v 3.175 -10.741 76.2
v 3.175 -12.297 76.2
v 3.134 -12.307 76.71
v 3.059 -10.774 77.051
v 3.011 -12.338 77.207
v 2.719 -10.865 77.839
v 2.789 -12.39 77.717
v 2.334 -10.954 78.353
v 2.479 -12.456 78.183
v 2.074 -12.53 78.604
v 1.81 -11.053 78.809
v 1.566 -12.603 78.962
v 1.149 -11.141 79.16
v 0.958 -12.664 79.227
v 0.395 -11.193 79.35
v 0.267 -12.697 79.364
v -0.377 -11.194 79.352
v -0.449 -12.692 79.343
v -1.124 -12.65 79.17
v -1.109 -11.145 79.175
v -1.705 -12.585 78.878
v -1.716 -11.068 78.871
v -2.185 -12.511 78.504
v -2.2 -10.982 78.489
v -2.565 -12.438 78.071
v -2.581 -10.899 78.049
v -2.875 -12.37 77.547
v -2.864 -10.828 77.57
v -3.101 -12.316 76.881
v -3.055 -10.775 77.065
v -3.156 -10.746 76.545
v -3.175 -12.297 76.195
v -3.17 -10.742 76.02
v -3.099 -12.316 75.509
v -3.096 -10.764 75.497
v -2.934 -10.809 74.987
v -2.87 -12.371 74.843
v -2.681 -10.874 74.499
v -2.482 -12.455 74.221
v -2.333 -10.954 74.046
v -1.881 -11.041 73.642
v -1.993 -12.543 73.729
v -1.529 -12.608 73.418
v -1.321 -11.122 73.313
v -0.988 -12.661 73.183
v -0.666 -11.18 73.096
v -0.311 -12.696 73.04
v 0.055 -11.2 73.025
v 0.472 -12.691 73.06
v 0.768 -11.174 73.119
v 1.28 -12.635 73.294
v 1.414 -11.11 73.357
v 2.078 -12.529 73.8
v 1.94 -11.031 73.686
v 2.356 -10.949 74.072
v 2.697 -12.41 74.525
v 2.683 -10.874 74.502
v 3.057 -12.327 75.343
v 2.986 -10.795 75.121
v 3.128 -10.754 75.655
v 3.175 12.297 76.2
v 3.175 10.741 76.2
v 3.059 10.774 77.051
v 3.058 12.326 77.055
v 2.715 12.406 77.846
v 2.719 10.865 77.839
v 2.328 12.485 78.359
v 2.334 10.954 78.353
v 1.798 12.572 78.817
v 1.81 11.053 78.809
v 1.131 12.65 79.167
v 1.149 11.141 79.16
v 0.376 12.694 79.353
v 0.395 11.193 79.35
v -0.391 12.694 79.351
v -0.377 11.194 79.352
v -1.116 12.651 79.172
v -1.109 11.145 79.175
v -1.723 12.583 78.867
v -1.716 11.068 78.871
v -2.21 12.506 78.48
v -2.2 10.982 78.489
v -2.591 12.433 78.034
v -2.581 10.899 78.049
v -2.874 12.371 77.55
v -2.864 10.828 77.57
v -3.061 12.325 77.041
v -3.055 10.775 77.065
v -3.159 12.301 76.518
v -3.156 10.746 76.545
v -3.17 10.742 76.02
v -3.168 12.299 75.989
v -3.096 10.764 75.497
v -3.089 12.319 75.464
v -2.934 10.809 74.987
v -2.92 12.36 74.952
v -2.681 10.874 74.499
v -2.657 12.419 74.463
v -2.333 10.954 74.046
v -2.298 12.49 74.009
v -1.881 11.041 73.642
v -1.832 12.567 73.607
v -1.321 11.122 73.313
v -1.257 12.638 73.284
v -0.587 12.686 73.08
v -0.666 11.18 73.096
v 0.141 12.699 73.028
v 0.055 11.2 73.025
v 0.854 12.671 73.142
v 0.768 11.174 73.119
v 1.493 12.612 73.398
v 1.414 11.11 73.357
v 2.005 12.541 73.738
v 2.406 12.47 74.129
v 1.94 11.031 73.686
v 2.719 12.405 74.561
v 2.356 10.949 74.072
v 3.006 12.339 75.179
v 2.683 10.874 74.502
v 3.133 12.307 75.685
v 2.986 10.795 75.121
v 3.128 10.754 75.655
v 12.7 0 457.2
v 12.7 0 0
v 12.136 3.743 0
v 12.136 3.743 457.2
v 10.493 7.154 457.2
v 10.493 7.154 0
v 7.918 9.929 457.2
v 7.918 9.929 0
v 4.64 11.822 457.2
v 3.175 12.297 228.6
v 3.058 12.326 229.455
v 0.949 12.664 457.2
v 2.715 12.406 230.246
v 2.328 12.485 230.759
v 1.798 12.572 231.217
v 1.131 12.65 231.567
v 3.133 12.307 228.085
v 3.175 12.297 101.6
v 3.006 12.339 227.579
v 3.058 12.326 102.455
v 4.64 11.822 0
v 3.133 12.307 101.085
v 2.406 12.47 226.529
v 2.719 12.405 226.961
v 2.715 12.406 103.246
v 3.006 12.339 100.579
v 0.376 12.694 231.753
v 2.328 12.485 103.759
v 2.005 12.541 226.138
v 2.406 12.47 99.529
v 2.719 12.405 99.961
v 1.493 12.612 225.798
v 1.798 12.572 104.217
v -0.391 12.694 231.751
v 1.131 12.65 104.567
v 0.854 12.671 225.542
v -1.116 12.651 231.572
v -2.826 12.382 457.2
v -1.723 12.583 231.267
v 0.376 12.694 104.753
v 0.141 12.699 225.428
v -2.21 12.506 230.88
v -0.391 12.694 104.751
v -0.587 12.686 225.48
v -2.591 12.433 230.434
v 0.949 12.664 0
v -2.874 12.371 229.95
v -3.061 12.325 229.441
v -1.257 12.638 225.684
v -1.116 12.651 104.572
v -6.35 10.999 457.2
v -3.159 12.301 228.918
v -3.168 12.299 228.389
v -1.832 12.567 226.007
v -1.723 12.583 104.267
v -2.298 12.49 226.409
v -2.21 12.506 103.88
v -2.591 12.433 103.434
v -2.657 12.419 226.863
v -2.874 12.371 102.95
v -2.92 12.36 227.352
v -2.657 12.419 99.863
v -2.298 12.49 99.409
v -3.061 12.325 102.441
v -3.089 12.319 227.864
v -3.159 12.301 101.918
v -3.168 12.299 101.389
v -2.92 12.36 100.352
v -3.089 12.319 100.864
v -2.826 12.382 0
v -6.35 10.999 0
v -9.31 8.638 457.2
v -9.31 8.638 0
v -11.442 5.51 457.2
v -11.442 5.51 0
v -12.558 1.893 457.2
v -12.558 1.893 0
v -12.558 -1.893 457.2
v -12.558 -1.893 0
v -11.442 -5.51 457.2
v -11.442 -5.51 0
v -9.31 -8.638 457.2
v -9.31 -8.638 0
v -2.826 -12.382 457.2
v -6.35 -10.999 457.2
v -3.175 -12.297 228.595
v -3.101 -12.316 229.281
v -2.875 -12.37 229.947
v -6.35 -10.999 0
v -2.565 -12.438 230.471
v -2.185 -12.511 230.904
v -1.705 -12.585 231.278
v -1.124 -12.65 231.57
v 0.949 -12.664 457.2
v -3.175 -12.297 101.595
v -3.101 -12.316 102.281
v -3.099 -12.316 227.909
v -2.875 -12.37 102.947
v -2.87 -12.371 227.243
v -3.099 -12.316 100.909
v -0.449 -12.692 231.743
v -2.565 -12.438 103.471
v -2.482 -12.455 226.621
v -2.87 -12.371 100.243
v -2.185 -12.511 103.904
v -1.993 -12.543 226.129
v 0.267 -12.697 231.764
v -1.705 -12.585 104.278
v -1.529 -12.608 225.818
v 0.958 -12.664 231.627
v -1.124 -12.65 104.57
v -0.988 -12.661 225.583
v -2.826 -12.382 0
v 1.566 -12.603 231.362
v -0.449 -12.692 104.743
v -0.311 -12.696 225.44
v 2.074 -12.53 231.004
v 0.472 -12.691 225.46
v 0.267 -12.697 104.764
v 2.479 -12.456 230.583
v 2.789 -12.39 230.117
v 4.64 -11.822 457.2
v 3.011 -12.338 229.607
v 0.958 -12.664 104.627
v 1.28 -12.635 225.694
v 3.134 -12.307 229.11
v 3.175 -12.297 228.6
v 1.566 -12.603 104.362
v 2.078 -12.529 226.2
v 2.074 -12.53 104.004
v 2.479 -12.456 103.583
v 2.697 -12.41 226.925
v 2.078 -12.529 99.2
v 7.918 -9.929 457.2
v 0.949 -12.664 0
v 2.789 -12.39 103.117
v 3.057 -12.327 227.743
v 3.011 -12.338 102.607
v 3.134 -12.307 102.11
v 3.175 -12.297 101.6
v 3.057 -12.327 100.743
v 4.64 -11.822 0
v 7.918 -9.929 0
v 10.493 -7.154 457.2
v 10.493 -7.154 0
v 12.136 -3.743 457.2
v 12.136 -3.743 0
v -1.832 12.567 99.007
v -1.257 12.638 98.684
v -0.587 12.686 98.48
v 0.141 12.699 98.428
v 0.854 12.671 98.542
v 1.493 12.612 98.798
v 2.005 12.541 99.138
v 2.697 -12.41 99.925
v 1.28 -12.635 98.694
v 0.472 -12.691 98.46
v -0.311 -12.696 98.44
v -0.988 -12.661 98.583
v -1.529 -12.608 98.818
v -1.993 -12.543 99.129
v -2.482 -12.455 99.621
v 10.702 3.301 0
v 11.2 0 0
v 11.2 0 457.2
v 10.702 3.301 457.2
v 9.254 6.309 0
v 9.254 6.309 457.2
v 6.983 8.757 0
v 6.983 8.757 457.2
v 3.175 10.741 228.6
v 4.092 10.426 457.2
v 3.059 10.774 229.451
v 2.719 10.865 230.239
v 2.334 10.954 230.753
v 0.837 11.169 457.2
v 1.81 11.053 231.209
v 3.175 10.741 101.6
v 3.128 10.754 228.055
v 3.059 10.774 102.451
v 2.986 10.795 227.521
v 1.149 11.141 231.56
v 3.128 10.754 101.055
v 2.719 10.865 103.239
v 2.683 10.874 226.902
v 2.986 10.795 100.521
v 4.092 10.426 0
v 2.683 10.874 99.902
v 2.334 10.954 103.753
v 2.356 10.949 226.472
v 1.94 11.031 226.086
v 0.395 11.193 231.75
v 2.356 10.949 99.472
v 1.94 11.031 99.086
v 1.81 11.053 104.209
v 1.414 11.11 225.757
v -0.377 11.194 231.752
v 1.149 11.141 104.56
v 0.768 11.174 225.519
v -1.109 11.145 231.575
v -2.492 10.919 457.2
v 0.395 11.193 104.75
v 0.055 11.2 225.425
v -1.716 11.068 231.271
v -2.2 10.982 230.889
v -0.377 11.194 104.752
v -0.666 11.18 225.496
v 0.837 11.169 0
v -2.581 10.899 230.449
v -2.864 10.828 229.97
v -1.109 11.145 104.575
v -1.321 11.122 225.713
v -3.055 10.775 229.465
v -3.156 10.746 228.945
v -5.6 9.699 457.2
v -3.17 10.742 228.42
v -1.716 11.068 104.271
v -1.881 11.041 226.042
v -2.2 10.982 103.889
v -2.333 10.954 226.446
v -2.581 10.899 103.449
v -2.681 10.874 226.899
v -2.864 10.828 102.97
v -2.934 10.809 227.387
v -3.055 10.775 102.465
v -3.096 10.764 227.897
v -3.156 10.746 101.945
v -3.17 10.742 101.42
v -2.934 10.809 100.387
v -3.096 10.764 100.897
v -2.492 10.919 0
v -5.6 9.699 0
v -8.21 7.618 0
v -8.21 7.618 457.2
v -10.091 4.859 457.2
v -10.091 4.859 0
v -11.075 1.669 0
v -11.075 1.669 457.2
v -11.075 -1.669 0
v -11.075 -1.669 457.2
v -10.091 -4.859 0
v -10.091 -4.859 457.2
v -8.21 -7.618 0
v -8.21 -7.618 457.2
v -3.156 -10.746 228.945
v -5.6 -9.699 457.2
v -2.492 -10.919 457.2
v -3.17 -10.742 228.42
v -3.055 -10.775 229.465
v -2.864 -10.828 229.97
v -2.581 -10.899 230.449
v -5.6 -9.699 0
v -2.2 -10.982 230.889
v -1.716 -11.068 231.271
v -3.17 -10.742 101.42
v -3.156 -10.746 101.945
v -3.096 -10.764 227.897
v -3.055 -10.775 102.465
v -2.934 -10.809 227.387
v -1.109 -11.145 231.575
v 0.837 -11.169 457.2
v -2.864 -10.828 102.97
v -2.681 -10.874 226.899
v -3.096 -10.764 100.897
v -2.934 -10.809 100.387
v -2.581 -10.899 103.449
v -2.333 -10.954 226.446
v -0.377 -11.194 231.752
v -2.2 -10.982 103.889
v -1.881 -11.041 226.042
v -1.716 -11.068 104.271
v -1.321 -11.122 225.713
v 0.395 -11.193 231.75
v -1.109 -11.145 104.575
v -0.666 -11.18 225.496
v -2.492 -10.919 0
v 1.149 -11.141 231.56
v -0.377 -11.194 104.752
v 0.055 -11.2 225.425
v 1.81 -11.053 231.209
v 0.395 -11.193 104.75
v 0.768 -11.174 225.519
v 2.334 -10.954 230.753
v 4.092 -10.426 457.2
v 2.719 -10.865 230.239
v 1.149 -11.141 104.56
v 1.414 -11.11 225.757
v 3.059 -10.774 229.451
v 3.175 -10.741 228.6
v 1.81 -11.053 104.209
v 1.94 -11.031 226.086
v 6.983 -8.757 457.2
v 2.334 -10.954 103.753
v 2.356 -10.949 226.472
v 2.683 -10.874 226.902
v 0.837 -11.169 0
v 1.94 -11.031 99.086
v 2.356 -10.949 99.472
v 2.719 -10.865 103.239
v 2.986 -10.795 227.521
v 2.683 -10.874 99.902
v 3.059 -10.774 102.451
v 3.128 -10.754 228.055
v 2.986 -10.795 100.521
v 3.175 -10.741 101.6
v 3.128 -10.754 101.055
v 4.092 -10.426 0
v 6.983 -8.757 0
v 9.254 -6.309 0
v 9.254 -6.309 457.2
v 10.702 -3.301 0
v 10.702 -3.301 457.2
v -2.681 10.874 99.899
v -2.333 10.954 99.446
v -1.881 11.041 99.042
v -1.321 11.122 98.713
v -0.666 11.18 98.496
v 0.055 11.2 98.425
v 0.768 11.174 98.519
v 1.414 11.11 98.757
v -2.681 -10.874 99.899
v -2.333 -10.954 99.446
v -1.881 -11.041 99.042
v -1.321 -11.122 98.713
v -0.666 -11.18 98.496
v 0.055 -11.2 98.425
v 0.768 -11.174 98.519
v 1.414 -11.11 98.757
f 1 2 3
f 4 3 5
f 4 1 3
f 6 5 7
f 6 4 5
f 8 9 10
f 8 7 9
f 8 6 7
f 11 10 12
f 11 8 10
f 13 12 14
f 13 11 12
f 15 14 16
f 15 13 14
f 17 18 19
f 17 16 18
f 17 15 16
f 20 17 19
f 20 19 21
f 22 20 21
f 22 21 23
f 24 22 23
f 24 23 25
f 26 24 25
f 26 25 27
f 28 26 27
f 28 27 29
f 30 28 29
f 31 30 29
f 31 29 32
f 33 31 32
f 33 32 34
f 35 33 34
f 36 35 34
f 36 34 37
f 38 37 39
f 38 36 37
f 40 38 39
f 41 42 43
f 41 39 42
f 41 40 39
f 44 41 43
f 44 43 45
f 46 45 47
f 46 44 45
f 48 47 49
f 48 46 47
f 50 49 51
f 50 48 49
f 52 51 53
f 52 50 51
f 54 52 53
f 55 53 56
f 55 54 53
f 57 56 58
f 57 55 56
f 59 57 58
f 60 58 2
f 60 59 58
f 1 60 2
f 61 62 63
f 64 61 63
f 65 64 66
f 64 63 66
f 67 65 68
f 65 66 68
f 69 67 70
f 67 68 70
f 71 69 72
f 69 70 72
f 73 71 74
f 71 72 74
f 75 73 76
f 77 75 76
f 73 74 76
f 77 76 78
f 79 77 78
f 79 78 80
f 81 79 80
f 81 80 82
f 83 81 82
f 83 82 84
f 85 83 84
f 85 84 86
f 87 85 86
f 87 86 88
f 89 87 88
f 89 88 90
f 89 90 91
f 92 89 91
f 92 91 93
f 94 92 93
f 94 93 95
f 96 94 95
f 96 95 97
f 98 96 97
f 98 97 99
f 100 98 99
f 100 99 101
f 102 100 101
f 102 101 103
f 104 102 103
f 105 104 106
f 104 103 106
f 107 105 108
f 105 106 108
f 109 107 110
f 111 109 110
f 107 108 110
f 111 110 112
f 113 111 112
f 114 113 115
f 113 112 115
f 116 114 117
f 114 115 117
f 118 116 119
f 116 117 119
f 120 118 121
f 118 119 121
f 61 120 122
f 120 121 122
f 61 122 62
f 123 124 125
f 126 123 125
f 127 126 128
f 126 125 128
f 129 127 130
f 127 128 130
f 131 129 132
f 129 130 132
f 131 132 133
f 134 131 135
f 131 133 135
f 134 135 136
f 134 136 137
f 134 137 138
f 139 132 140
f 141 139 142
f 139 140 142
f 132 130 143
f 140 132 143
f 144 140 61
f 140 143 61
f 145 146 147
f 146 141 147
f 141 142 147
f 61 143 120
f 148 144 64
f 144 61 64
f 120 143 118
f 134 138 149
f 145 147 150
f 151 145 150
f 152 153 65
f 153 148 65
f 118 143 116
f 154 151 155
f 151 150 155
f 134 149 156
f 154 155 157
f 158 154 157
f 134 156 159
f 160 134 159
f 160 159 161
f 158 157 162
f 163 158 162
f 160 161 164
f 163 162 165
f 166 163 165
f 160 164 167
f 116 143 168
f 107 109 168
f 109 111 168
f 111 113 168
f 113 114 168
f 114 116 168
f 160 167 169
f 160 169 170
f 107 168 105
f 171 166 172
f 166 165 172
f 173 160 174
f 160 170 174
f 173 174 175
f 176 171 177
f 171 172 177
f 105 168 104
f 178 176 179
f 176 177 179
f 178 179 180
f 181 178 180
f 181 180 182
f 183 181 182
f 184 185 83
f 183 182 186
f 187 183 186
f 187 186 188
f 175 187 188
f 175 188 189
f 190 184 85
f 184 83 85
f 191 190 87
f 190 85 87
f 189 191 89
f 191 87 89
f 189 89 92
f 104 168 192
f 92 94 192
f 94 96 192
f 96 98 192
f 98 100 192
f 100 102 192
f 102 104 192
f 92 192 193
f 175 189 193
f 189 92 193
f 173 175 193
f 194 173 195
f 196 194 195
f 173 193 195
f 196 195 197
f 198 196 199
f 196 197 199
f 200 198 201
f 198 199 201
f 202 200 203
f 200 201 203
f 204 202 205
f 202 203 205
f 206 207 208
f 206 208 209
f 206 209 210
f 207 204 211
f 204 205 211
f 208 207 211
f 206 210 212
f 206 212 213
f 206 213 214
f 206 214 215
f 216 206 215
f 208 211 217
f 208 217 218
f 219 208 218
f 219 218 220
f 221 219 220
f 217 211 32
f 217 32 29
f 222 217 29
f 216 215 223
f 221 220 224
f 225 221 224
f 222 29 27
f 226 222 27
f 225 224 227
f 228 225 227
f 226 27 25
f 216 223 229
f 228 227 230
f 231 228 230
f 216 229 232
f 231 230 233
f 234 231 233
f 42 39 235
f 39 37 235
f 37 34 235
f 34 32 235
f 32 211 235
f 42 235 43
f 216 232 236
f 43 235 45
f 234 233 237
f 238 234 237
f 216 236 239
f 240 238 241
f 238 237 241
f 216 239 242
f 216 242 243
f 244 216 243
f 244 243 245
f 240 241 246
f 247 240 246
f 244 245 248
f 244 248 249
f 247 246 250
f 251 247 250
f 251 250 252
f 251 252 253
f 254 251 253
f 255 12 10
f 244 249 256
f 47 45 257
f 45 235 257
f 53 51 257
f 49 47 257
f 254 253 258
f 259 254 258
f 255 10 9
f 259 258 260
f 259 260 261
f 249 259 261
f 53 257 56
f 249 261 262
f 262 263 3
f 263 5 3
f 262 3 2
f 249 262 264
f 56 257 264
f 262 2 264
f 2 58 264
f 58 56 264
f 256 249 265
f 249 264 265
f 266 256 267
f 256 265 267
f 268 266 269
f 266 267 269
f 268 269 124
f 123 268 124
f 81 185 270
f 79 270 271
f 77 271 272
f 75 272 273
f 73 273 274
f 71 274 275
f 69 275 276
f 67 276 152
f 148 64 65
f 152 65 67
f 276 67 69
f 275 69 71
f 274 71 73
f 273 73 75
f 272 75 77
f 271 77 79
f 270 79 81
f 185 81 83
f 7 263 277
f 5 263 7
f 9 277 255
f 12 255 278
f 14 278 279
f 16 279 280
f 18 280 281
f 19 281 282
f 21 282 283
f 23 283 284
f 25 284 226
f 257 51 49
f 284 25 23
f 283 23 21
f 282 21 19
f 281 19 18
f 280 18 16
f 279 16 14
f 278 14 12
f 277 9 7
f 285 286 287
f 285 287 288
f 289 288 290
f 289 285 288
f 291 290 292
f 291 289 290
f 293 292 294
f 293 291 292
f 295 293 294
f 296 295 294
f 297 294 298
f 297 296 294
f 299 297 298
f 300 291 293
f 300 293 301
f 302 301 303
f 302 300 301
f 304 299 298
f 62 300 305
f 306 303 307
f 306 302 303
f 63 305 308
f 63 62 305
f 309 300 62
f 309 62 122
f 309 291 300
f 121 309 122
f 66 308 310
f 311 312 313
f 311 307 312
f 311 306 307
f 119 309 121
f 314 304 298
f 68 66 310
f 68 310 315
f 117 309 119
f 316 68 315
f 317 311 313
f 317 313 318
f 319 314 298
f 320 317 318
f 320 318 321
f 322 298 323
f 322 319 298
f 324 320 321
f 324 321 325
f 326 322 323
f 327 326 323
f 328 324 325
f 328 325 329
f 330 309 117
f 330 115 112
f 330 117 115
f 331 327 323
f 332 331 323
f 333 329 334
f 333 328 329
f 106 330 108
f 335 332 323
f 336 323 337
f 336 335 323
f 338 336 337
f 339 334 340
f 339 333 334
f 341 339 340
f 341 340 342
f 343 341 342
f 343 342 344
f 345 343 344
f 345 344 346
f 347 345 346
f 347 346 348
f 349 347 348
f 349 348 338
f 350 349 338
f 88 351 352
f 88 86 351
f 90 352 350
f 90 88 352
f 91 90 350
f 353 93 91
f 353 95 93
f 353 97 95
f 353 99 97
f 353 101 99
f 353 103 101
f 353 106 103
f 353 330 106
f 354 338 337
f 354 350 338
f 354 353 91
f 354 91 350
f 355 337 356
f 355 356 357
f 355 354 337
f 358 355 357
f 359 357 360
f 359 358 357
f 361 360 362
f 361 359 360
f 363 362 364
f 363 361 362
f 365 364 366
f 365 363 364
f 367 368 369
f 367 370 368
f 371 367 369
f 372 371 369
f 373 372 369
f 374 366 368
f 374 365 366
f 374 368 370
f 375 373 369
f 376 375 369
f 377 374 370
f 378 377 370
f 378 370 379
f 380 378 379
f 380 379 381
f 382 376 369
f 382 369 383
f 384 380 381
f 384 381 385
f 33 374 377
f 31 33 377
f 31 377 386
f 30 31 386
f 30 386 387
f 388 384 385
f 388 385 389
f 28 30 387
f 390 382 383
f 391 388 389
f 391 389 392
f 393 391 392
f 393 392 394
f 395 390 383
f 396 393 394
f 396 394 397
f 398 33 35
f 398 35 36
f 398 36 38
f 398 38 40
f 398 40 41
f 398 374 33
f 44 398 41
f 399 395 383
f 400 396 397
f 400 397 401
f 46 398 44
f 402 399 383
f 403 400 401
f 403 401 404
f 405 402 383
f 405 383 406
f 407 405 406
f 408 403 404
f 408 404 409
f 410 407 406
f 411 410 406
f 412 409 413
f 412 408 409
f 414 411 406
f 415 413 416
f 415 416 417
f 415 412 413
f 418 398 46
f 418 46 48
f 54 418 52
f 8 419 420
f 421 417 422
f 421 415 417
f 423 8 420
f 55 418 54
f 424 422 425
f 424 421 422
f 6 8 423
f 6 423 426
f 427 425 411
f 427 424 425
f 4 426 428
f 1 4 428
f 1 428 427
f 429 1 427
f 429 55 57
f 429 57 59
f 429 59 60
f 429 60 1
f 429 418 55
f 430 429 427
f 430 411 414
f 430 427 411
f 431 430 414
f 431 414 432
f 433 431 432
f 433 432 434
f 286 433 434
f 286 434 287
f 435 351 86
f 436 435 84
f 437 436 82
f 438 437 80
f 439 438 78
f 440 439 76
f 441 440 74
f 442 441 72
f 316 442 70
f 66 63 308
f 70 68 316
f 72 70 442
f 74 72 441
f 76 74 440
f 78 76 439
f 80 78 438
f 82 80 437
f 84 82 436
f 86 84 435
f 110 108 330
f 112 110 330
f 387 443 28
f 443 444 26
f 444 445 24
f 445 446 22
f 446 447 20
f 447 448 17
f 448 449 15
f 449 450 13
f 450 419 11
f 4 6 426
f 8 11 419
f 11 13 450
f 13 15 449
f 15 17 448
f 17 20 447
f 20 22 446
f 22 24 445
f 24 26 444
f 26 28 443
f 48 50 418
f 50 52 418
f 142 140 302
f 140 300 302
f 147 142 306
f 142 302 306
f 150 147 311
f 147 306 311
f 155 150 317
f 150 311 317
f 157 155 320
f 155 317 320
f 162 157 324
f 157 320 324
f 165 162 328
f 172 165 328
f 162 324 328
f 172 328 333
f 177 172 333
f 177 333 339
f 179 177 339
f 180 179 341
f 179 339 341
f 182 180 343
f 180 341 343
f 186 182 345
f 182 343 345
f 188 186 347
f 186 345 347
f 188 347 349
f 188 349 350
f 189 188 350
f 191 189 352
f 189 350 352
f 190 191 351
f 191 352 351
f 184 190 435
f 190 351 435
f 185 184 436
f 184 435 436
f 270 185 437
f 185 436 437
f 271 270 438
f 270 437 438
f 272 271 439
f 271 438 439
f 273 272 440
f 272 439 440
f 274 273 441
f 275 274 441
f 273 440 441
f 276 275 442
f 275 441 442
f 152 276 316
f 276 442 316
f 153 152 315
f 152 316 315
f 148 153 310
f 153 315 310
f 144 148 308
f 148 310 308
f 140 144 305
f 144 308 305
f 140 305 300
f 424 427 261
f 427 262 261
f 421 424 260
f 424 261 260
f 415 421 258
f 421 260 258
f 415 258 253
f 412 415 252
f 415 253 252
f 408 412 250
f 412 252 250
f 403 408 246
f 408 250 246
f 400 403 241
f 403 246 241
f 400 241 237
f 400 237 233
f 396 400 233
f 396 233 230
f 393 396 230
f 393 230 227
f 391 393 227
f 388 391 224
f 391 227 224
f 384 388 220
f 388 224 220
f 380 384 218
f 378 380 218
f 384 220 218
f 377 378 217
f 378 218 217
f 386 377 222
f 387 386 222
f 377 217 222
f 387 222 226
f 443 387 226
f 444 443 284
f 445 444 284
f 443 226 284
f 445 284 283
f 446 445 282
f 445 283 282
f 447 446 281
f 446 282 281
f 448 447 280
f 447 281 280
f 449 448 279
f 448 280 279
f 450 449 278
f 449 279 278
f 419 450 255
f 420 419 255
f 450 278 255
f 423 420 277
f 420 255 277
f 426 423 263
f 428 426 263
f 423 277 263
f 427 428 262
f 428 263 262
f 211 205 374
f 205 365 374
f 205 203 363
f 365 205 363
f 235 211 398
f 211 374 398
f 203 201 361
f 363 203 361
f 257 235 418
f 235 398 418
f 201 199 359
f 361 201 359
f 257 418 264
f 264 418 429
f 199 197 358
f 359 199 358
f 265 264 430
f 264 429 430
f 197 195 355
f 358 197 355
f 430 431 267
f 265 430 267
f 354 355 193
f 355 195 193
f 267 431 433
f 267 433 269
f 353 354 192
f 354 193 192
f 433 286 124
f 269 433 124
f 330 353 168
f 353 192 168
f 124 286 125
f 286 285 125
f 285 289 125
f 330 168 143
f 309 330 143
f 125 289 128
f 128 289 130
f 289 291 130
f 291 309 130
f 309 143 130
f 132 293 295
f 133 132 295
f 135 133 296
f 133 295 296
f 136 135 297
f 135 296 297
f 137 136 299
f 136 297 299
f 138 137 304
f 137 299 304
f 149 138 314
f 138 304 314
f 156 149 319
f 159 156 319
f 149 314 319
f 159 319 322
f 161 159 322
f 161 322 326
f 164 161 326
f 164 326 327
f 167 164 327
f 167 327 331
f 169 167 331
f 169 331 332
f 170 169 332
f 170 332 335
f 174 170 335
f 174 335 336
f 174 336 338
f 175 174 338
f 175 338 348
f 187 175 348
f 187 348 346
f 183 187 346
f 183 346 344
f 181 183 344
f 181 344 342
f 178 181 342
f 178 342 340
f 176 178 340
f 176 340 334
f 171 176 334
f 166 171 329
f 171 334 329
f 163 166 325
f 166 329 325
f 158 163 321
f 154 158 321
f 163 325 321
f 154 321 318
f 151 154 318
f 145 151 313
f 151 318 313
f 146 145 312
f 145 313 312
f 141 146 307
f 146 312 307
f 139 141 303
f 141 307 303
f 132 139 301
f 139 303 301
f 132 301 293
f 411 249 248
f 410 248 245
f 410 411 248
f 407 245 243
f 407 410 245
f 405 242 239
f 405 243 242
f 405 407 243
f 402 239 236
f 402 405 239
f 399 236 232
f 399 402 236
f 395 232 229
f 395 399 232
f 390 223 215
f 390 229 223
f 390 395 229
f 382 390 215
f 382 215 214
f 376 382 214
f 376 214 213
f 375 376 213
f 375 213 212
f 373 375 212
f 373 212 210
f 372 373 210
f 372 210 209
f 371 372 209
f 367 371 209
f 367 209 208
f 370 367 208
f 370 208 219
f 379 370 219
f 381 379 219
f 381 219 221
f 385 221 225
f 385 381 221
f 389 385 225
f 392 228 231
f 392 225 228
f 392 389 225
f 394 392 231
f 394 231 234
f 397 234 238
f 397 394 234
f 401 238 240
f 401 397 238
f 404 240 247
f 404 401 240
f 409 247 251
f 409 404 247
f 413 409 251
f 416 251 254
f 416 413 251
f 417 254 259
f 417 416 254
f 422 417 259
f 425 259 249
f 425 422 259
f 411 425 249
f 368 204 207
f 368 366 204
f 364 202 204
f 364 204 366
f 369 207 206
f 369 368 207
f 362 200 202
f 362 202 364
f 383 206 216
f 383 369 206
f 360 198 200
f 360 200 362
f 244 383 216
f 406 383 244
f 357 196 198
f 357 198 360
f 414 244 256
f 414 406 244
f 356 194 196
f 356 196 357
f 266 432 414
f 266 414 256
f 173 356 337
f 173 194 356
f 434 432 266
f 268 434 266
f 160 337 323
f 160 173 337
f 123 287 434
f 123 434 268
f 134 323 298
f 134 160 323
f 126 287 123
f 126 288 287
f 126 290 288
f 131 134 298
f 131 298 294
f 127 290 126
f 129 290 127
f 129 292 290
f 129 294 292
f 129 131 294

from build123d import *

# Parameters (mm, degrees)
F0_R     = 12.7
F0_R_2   = 11.2
F1_DEPTH = 457.2
F2_R     = 3.175
F3_DEPTH = 12.7


with BuildPart() as f1:
    # F0 (on Top) → F1 (new body)
    with BuildSketch(Plane.XY):
        Circle(F0_R)
        Circle(F0_R_2, mode=Mode.SUBTRACT)
    extrude(amount=F1_DEPTH)

    # F2 (on Front) → F3 (cut, symmetric)
    with BuildSketch(Plane.XZ):
        with Locations((0, 76.2)):
            Circle(F2_R)
        with Locations((0, 228.6)):
            Circle(F2_R)
        with Locations((0, 101.6)):
            Circle(F2_R)
    extrude(amount=F3_DEPTH, both=True, mode=Mode.SUBTRACT)


solid = f1.part
